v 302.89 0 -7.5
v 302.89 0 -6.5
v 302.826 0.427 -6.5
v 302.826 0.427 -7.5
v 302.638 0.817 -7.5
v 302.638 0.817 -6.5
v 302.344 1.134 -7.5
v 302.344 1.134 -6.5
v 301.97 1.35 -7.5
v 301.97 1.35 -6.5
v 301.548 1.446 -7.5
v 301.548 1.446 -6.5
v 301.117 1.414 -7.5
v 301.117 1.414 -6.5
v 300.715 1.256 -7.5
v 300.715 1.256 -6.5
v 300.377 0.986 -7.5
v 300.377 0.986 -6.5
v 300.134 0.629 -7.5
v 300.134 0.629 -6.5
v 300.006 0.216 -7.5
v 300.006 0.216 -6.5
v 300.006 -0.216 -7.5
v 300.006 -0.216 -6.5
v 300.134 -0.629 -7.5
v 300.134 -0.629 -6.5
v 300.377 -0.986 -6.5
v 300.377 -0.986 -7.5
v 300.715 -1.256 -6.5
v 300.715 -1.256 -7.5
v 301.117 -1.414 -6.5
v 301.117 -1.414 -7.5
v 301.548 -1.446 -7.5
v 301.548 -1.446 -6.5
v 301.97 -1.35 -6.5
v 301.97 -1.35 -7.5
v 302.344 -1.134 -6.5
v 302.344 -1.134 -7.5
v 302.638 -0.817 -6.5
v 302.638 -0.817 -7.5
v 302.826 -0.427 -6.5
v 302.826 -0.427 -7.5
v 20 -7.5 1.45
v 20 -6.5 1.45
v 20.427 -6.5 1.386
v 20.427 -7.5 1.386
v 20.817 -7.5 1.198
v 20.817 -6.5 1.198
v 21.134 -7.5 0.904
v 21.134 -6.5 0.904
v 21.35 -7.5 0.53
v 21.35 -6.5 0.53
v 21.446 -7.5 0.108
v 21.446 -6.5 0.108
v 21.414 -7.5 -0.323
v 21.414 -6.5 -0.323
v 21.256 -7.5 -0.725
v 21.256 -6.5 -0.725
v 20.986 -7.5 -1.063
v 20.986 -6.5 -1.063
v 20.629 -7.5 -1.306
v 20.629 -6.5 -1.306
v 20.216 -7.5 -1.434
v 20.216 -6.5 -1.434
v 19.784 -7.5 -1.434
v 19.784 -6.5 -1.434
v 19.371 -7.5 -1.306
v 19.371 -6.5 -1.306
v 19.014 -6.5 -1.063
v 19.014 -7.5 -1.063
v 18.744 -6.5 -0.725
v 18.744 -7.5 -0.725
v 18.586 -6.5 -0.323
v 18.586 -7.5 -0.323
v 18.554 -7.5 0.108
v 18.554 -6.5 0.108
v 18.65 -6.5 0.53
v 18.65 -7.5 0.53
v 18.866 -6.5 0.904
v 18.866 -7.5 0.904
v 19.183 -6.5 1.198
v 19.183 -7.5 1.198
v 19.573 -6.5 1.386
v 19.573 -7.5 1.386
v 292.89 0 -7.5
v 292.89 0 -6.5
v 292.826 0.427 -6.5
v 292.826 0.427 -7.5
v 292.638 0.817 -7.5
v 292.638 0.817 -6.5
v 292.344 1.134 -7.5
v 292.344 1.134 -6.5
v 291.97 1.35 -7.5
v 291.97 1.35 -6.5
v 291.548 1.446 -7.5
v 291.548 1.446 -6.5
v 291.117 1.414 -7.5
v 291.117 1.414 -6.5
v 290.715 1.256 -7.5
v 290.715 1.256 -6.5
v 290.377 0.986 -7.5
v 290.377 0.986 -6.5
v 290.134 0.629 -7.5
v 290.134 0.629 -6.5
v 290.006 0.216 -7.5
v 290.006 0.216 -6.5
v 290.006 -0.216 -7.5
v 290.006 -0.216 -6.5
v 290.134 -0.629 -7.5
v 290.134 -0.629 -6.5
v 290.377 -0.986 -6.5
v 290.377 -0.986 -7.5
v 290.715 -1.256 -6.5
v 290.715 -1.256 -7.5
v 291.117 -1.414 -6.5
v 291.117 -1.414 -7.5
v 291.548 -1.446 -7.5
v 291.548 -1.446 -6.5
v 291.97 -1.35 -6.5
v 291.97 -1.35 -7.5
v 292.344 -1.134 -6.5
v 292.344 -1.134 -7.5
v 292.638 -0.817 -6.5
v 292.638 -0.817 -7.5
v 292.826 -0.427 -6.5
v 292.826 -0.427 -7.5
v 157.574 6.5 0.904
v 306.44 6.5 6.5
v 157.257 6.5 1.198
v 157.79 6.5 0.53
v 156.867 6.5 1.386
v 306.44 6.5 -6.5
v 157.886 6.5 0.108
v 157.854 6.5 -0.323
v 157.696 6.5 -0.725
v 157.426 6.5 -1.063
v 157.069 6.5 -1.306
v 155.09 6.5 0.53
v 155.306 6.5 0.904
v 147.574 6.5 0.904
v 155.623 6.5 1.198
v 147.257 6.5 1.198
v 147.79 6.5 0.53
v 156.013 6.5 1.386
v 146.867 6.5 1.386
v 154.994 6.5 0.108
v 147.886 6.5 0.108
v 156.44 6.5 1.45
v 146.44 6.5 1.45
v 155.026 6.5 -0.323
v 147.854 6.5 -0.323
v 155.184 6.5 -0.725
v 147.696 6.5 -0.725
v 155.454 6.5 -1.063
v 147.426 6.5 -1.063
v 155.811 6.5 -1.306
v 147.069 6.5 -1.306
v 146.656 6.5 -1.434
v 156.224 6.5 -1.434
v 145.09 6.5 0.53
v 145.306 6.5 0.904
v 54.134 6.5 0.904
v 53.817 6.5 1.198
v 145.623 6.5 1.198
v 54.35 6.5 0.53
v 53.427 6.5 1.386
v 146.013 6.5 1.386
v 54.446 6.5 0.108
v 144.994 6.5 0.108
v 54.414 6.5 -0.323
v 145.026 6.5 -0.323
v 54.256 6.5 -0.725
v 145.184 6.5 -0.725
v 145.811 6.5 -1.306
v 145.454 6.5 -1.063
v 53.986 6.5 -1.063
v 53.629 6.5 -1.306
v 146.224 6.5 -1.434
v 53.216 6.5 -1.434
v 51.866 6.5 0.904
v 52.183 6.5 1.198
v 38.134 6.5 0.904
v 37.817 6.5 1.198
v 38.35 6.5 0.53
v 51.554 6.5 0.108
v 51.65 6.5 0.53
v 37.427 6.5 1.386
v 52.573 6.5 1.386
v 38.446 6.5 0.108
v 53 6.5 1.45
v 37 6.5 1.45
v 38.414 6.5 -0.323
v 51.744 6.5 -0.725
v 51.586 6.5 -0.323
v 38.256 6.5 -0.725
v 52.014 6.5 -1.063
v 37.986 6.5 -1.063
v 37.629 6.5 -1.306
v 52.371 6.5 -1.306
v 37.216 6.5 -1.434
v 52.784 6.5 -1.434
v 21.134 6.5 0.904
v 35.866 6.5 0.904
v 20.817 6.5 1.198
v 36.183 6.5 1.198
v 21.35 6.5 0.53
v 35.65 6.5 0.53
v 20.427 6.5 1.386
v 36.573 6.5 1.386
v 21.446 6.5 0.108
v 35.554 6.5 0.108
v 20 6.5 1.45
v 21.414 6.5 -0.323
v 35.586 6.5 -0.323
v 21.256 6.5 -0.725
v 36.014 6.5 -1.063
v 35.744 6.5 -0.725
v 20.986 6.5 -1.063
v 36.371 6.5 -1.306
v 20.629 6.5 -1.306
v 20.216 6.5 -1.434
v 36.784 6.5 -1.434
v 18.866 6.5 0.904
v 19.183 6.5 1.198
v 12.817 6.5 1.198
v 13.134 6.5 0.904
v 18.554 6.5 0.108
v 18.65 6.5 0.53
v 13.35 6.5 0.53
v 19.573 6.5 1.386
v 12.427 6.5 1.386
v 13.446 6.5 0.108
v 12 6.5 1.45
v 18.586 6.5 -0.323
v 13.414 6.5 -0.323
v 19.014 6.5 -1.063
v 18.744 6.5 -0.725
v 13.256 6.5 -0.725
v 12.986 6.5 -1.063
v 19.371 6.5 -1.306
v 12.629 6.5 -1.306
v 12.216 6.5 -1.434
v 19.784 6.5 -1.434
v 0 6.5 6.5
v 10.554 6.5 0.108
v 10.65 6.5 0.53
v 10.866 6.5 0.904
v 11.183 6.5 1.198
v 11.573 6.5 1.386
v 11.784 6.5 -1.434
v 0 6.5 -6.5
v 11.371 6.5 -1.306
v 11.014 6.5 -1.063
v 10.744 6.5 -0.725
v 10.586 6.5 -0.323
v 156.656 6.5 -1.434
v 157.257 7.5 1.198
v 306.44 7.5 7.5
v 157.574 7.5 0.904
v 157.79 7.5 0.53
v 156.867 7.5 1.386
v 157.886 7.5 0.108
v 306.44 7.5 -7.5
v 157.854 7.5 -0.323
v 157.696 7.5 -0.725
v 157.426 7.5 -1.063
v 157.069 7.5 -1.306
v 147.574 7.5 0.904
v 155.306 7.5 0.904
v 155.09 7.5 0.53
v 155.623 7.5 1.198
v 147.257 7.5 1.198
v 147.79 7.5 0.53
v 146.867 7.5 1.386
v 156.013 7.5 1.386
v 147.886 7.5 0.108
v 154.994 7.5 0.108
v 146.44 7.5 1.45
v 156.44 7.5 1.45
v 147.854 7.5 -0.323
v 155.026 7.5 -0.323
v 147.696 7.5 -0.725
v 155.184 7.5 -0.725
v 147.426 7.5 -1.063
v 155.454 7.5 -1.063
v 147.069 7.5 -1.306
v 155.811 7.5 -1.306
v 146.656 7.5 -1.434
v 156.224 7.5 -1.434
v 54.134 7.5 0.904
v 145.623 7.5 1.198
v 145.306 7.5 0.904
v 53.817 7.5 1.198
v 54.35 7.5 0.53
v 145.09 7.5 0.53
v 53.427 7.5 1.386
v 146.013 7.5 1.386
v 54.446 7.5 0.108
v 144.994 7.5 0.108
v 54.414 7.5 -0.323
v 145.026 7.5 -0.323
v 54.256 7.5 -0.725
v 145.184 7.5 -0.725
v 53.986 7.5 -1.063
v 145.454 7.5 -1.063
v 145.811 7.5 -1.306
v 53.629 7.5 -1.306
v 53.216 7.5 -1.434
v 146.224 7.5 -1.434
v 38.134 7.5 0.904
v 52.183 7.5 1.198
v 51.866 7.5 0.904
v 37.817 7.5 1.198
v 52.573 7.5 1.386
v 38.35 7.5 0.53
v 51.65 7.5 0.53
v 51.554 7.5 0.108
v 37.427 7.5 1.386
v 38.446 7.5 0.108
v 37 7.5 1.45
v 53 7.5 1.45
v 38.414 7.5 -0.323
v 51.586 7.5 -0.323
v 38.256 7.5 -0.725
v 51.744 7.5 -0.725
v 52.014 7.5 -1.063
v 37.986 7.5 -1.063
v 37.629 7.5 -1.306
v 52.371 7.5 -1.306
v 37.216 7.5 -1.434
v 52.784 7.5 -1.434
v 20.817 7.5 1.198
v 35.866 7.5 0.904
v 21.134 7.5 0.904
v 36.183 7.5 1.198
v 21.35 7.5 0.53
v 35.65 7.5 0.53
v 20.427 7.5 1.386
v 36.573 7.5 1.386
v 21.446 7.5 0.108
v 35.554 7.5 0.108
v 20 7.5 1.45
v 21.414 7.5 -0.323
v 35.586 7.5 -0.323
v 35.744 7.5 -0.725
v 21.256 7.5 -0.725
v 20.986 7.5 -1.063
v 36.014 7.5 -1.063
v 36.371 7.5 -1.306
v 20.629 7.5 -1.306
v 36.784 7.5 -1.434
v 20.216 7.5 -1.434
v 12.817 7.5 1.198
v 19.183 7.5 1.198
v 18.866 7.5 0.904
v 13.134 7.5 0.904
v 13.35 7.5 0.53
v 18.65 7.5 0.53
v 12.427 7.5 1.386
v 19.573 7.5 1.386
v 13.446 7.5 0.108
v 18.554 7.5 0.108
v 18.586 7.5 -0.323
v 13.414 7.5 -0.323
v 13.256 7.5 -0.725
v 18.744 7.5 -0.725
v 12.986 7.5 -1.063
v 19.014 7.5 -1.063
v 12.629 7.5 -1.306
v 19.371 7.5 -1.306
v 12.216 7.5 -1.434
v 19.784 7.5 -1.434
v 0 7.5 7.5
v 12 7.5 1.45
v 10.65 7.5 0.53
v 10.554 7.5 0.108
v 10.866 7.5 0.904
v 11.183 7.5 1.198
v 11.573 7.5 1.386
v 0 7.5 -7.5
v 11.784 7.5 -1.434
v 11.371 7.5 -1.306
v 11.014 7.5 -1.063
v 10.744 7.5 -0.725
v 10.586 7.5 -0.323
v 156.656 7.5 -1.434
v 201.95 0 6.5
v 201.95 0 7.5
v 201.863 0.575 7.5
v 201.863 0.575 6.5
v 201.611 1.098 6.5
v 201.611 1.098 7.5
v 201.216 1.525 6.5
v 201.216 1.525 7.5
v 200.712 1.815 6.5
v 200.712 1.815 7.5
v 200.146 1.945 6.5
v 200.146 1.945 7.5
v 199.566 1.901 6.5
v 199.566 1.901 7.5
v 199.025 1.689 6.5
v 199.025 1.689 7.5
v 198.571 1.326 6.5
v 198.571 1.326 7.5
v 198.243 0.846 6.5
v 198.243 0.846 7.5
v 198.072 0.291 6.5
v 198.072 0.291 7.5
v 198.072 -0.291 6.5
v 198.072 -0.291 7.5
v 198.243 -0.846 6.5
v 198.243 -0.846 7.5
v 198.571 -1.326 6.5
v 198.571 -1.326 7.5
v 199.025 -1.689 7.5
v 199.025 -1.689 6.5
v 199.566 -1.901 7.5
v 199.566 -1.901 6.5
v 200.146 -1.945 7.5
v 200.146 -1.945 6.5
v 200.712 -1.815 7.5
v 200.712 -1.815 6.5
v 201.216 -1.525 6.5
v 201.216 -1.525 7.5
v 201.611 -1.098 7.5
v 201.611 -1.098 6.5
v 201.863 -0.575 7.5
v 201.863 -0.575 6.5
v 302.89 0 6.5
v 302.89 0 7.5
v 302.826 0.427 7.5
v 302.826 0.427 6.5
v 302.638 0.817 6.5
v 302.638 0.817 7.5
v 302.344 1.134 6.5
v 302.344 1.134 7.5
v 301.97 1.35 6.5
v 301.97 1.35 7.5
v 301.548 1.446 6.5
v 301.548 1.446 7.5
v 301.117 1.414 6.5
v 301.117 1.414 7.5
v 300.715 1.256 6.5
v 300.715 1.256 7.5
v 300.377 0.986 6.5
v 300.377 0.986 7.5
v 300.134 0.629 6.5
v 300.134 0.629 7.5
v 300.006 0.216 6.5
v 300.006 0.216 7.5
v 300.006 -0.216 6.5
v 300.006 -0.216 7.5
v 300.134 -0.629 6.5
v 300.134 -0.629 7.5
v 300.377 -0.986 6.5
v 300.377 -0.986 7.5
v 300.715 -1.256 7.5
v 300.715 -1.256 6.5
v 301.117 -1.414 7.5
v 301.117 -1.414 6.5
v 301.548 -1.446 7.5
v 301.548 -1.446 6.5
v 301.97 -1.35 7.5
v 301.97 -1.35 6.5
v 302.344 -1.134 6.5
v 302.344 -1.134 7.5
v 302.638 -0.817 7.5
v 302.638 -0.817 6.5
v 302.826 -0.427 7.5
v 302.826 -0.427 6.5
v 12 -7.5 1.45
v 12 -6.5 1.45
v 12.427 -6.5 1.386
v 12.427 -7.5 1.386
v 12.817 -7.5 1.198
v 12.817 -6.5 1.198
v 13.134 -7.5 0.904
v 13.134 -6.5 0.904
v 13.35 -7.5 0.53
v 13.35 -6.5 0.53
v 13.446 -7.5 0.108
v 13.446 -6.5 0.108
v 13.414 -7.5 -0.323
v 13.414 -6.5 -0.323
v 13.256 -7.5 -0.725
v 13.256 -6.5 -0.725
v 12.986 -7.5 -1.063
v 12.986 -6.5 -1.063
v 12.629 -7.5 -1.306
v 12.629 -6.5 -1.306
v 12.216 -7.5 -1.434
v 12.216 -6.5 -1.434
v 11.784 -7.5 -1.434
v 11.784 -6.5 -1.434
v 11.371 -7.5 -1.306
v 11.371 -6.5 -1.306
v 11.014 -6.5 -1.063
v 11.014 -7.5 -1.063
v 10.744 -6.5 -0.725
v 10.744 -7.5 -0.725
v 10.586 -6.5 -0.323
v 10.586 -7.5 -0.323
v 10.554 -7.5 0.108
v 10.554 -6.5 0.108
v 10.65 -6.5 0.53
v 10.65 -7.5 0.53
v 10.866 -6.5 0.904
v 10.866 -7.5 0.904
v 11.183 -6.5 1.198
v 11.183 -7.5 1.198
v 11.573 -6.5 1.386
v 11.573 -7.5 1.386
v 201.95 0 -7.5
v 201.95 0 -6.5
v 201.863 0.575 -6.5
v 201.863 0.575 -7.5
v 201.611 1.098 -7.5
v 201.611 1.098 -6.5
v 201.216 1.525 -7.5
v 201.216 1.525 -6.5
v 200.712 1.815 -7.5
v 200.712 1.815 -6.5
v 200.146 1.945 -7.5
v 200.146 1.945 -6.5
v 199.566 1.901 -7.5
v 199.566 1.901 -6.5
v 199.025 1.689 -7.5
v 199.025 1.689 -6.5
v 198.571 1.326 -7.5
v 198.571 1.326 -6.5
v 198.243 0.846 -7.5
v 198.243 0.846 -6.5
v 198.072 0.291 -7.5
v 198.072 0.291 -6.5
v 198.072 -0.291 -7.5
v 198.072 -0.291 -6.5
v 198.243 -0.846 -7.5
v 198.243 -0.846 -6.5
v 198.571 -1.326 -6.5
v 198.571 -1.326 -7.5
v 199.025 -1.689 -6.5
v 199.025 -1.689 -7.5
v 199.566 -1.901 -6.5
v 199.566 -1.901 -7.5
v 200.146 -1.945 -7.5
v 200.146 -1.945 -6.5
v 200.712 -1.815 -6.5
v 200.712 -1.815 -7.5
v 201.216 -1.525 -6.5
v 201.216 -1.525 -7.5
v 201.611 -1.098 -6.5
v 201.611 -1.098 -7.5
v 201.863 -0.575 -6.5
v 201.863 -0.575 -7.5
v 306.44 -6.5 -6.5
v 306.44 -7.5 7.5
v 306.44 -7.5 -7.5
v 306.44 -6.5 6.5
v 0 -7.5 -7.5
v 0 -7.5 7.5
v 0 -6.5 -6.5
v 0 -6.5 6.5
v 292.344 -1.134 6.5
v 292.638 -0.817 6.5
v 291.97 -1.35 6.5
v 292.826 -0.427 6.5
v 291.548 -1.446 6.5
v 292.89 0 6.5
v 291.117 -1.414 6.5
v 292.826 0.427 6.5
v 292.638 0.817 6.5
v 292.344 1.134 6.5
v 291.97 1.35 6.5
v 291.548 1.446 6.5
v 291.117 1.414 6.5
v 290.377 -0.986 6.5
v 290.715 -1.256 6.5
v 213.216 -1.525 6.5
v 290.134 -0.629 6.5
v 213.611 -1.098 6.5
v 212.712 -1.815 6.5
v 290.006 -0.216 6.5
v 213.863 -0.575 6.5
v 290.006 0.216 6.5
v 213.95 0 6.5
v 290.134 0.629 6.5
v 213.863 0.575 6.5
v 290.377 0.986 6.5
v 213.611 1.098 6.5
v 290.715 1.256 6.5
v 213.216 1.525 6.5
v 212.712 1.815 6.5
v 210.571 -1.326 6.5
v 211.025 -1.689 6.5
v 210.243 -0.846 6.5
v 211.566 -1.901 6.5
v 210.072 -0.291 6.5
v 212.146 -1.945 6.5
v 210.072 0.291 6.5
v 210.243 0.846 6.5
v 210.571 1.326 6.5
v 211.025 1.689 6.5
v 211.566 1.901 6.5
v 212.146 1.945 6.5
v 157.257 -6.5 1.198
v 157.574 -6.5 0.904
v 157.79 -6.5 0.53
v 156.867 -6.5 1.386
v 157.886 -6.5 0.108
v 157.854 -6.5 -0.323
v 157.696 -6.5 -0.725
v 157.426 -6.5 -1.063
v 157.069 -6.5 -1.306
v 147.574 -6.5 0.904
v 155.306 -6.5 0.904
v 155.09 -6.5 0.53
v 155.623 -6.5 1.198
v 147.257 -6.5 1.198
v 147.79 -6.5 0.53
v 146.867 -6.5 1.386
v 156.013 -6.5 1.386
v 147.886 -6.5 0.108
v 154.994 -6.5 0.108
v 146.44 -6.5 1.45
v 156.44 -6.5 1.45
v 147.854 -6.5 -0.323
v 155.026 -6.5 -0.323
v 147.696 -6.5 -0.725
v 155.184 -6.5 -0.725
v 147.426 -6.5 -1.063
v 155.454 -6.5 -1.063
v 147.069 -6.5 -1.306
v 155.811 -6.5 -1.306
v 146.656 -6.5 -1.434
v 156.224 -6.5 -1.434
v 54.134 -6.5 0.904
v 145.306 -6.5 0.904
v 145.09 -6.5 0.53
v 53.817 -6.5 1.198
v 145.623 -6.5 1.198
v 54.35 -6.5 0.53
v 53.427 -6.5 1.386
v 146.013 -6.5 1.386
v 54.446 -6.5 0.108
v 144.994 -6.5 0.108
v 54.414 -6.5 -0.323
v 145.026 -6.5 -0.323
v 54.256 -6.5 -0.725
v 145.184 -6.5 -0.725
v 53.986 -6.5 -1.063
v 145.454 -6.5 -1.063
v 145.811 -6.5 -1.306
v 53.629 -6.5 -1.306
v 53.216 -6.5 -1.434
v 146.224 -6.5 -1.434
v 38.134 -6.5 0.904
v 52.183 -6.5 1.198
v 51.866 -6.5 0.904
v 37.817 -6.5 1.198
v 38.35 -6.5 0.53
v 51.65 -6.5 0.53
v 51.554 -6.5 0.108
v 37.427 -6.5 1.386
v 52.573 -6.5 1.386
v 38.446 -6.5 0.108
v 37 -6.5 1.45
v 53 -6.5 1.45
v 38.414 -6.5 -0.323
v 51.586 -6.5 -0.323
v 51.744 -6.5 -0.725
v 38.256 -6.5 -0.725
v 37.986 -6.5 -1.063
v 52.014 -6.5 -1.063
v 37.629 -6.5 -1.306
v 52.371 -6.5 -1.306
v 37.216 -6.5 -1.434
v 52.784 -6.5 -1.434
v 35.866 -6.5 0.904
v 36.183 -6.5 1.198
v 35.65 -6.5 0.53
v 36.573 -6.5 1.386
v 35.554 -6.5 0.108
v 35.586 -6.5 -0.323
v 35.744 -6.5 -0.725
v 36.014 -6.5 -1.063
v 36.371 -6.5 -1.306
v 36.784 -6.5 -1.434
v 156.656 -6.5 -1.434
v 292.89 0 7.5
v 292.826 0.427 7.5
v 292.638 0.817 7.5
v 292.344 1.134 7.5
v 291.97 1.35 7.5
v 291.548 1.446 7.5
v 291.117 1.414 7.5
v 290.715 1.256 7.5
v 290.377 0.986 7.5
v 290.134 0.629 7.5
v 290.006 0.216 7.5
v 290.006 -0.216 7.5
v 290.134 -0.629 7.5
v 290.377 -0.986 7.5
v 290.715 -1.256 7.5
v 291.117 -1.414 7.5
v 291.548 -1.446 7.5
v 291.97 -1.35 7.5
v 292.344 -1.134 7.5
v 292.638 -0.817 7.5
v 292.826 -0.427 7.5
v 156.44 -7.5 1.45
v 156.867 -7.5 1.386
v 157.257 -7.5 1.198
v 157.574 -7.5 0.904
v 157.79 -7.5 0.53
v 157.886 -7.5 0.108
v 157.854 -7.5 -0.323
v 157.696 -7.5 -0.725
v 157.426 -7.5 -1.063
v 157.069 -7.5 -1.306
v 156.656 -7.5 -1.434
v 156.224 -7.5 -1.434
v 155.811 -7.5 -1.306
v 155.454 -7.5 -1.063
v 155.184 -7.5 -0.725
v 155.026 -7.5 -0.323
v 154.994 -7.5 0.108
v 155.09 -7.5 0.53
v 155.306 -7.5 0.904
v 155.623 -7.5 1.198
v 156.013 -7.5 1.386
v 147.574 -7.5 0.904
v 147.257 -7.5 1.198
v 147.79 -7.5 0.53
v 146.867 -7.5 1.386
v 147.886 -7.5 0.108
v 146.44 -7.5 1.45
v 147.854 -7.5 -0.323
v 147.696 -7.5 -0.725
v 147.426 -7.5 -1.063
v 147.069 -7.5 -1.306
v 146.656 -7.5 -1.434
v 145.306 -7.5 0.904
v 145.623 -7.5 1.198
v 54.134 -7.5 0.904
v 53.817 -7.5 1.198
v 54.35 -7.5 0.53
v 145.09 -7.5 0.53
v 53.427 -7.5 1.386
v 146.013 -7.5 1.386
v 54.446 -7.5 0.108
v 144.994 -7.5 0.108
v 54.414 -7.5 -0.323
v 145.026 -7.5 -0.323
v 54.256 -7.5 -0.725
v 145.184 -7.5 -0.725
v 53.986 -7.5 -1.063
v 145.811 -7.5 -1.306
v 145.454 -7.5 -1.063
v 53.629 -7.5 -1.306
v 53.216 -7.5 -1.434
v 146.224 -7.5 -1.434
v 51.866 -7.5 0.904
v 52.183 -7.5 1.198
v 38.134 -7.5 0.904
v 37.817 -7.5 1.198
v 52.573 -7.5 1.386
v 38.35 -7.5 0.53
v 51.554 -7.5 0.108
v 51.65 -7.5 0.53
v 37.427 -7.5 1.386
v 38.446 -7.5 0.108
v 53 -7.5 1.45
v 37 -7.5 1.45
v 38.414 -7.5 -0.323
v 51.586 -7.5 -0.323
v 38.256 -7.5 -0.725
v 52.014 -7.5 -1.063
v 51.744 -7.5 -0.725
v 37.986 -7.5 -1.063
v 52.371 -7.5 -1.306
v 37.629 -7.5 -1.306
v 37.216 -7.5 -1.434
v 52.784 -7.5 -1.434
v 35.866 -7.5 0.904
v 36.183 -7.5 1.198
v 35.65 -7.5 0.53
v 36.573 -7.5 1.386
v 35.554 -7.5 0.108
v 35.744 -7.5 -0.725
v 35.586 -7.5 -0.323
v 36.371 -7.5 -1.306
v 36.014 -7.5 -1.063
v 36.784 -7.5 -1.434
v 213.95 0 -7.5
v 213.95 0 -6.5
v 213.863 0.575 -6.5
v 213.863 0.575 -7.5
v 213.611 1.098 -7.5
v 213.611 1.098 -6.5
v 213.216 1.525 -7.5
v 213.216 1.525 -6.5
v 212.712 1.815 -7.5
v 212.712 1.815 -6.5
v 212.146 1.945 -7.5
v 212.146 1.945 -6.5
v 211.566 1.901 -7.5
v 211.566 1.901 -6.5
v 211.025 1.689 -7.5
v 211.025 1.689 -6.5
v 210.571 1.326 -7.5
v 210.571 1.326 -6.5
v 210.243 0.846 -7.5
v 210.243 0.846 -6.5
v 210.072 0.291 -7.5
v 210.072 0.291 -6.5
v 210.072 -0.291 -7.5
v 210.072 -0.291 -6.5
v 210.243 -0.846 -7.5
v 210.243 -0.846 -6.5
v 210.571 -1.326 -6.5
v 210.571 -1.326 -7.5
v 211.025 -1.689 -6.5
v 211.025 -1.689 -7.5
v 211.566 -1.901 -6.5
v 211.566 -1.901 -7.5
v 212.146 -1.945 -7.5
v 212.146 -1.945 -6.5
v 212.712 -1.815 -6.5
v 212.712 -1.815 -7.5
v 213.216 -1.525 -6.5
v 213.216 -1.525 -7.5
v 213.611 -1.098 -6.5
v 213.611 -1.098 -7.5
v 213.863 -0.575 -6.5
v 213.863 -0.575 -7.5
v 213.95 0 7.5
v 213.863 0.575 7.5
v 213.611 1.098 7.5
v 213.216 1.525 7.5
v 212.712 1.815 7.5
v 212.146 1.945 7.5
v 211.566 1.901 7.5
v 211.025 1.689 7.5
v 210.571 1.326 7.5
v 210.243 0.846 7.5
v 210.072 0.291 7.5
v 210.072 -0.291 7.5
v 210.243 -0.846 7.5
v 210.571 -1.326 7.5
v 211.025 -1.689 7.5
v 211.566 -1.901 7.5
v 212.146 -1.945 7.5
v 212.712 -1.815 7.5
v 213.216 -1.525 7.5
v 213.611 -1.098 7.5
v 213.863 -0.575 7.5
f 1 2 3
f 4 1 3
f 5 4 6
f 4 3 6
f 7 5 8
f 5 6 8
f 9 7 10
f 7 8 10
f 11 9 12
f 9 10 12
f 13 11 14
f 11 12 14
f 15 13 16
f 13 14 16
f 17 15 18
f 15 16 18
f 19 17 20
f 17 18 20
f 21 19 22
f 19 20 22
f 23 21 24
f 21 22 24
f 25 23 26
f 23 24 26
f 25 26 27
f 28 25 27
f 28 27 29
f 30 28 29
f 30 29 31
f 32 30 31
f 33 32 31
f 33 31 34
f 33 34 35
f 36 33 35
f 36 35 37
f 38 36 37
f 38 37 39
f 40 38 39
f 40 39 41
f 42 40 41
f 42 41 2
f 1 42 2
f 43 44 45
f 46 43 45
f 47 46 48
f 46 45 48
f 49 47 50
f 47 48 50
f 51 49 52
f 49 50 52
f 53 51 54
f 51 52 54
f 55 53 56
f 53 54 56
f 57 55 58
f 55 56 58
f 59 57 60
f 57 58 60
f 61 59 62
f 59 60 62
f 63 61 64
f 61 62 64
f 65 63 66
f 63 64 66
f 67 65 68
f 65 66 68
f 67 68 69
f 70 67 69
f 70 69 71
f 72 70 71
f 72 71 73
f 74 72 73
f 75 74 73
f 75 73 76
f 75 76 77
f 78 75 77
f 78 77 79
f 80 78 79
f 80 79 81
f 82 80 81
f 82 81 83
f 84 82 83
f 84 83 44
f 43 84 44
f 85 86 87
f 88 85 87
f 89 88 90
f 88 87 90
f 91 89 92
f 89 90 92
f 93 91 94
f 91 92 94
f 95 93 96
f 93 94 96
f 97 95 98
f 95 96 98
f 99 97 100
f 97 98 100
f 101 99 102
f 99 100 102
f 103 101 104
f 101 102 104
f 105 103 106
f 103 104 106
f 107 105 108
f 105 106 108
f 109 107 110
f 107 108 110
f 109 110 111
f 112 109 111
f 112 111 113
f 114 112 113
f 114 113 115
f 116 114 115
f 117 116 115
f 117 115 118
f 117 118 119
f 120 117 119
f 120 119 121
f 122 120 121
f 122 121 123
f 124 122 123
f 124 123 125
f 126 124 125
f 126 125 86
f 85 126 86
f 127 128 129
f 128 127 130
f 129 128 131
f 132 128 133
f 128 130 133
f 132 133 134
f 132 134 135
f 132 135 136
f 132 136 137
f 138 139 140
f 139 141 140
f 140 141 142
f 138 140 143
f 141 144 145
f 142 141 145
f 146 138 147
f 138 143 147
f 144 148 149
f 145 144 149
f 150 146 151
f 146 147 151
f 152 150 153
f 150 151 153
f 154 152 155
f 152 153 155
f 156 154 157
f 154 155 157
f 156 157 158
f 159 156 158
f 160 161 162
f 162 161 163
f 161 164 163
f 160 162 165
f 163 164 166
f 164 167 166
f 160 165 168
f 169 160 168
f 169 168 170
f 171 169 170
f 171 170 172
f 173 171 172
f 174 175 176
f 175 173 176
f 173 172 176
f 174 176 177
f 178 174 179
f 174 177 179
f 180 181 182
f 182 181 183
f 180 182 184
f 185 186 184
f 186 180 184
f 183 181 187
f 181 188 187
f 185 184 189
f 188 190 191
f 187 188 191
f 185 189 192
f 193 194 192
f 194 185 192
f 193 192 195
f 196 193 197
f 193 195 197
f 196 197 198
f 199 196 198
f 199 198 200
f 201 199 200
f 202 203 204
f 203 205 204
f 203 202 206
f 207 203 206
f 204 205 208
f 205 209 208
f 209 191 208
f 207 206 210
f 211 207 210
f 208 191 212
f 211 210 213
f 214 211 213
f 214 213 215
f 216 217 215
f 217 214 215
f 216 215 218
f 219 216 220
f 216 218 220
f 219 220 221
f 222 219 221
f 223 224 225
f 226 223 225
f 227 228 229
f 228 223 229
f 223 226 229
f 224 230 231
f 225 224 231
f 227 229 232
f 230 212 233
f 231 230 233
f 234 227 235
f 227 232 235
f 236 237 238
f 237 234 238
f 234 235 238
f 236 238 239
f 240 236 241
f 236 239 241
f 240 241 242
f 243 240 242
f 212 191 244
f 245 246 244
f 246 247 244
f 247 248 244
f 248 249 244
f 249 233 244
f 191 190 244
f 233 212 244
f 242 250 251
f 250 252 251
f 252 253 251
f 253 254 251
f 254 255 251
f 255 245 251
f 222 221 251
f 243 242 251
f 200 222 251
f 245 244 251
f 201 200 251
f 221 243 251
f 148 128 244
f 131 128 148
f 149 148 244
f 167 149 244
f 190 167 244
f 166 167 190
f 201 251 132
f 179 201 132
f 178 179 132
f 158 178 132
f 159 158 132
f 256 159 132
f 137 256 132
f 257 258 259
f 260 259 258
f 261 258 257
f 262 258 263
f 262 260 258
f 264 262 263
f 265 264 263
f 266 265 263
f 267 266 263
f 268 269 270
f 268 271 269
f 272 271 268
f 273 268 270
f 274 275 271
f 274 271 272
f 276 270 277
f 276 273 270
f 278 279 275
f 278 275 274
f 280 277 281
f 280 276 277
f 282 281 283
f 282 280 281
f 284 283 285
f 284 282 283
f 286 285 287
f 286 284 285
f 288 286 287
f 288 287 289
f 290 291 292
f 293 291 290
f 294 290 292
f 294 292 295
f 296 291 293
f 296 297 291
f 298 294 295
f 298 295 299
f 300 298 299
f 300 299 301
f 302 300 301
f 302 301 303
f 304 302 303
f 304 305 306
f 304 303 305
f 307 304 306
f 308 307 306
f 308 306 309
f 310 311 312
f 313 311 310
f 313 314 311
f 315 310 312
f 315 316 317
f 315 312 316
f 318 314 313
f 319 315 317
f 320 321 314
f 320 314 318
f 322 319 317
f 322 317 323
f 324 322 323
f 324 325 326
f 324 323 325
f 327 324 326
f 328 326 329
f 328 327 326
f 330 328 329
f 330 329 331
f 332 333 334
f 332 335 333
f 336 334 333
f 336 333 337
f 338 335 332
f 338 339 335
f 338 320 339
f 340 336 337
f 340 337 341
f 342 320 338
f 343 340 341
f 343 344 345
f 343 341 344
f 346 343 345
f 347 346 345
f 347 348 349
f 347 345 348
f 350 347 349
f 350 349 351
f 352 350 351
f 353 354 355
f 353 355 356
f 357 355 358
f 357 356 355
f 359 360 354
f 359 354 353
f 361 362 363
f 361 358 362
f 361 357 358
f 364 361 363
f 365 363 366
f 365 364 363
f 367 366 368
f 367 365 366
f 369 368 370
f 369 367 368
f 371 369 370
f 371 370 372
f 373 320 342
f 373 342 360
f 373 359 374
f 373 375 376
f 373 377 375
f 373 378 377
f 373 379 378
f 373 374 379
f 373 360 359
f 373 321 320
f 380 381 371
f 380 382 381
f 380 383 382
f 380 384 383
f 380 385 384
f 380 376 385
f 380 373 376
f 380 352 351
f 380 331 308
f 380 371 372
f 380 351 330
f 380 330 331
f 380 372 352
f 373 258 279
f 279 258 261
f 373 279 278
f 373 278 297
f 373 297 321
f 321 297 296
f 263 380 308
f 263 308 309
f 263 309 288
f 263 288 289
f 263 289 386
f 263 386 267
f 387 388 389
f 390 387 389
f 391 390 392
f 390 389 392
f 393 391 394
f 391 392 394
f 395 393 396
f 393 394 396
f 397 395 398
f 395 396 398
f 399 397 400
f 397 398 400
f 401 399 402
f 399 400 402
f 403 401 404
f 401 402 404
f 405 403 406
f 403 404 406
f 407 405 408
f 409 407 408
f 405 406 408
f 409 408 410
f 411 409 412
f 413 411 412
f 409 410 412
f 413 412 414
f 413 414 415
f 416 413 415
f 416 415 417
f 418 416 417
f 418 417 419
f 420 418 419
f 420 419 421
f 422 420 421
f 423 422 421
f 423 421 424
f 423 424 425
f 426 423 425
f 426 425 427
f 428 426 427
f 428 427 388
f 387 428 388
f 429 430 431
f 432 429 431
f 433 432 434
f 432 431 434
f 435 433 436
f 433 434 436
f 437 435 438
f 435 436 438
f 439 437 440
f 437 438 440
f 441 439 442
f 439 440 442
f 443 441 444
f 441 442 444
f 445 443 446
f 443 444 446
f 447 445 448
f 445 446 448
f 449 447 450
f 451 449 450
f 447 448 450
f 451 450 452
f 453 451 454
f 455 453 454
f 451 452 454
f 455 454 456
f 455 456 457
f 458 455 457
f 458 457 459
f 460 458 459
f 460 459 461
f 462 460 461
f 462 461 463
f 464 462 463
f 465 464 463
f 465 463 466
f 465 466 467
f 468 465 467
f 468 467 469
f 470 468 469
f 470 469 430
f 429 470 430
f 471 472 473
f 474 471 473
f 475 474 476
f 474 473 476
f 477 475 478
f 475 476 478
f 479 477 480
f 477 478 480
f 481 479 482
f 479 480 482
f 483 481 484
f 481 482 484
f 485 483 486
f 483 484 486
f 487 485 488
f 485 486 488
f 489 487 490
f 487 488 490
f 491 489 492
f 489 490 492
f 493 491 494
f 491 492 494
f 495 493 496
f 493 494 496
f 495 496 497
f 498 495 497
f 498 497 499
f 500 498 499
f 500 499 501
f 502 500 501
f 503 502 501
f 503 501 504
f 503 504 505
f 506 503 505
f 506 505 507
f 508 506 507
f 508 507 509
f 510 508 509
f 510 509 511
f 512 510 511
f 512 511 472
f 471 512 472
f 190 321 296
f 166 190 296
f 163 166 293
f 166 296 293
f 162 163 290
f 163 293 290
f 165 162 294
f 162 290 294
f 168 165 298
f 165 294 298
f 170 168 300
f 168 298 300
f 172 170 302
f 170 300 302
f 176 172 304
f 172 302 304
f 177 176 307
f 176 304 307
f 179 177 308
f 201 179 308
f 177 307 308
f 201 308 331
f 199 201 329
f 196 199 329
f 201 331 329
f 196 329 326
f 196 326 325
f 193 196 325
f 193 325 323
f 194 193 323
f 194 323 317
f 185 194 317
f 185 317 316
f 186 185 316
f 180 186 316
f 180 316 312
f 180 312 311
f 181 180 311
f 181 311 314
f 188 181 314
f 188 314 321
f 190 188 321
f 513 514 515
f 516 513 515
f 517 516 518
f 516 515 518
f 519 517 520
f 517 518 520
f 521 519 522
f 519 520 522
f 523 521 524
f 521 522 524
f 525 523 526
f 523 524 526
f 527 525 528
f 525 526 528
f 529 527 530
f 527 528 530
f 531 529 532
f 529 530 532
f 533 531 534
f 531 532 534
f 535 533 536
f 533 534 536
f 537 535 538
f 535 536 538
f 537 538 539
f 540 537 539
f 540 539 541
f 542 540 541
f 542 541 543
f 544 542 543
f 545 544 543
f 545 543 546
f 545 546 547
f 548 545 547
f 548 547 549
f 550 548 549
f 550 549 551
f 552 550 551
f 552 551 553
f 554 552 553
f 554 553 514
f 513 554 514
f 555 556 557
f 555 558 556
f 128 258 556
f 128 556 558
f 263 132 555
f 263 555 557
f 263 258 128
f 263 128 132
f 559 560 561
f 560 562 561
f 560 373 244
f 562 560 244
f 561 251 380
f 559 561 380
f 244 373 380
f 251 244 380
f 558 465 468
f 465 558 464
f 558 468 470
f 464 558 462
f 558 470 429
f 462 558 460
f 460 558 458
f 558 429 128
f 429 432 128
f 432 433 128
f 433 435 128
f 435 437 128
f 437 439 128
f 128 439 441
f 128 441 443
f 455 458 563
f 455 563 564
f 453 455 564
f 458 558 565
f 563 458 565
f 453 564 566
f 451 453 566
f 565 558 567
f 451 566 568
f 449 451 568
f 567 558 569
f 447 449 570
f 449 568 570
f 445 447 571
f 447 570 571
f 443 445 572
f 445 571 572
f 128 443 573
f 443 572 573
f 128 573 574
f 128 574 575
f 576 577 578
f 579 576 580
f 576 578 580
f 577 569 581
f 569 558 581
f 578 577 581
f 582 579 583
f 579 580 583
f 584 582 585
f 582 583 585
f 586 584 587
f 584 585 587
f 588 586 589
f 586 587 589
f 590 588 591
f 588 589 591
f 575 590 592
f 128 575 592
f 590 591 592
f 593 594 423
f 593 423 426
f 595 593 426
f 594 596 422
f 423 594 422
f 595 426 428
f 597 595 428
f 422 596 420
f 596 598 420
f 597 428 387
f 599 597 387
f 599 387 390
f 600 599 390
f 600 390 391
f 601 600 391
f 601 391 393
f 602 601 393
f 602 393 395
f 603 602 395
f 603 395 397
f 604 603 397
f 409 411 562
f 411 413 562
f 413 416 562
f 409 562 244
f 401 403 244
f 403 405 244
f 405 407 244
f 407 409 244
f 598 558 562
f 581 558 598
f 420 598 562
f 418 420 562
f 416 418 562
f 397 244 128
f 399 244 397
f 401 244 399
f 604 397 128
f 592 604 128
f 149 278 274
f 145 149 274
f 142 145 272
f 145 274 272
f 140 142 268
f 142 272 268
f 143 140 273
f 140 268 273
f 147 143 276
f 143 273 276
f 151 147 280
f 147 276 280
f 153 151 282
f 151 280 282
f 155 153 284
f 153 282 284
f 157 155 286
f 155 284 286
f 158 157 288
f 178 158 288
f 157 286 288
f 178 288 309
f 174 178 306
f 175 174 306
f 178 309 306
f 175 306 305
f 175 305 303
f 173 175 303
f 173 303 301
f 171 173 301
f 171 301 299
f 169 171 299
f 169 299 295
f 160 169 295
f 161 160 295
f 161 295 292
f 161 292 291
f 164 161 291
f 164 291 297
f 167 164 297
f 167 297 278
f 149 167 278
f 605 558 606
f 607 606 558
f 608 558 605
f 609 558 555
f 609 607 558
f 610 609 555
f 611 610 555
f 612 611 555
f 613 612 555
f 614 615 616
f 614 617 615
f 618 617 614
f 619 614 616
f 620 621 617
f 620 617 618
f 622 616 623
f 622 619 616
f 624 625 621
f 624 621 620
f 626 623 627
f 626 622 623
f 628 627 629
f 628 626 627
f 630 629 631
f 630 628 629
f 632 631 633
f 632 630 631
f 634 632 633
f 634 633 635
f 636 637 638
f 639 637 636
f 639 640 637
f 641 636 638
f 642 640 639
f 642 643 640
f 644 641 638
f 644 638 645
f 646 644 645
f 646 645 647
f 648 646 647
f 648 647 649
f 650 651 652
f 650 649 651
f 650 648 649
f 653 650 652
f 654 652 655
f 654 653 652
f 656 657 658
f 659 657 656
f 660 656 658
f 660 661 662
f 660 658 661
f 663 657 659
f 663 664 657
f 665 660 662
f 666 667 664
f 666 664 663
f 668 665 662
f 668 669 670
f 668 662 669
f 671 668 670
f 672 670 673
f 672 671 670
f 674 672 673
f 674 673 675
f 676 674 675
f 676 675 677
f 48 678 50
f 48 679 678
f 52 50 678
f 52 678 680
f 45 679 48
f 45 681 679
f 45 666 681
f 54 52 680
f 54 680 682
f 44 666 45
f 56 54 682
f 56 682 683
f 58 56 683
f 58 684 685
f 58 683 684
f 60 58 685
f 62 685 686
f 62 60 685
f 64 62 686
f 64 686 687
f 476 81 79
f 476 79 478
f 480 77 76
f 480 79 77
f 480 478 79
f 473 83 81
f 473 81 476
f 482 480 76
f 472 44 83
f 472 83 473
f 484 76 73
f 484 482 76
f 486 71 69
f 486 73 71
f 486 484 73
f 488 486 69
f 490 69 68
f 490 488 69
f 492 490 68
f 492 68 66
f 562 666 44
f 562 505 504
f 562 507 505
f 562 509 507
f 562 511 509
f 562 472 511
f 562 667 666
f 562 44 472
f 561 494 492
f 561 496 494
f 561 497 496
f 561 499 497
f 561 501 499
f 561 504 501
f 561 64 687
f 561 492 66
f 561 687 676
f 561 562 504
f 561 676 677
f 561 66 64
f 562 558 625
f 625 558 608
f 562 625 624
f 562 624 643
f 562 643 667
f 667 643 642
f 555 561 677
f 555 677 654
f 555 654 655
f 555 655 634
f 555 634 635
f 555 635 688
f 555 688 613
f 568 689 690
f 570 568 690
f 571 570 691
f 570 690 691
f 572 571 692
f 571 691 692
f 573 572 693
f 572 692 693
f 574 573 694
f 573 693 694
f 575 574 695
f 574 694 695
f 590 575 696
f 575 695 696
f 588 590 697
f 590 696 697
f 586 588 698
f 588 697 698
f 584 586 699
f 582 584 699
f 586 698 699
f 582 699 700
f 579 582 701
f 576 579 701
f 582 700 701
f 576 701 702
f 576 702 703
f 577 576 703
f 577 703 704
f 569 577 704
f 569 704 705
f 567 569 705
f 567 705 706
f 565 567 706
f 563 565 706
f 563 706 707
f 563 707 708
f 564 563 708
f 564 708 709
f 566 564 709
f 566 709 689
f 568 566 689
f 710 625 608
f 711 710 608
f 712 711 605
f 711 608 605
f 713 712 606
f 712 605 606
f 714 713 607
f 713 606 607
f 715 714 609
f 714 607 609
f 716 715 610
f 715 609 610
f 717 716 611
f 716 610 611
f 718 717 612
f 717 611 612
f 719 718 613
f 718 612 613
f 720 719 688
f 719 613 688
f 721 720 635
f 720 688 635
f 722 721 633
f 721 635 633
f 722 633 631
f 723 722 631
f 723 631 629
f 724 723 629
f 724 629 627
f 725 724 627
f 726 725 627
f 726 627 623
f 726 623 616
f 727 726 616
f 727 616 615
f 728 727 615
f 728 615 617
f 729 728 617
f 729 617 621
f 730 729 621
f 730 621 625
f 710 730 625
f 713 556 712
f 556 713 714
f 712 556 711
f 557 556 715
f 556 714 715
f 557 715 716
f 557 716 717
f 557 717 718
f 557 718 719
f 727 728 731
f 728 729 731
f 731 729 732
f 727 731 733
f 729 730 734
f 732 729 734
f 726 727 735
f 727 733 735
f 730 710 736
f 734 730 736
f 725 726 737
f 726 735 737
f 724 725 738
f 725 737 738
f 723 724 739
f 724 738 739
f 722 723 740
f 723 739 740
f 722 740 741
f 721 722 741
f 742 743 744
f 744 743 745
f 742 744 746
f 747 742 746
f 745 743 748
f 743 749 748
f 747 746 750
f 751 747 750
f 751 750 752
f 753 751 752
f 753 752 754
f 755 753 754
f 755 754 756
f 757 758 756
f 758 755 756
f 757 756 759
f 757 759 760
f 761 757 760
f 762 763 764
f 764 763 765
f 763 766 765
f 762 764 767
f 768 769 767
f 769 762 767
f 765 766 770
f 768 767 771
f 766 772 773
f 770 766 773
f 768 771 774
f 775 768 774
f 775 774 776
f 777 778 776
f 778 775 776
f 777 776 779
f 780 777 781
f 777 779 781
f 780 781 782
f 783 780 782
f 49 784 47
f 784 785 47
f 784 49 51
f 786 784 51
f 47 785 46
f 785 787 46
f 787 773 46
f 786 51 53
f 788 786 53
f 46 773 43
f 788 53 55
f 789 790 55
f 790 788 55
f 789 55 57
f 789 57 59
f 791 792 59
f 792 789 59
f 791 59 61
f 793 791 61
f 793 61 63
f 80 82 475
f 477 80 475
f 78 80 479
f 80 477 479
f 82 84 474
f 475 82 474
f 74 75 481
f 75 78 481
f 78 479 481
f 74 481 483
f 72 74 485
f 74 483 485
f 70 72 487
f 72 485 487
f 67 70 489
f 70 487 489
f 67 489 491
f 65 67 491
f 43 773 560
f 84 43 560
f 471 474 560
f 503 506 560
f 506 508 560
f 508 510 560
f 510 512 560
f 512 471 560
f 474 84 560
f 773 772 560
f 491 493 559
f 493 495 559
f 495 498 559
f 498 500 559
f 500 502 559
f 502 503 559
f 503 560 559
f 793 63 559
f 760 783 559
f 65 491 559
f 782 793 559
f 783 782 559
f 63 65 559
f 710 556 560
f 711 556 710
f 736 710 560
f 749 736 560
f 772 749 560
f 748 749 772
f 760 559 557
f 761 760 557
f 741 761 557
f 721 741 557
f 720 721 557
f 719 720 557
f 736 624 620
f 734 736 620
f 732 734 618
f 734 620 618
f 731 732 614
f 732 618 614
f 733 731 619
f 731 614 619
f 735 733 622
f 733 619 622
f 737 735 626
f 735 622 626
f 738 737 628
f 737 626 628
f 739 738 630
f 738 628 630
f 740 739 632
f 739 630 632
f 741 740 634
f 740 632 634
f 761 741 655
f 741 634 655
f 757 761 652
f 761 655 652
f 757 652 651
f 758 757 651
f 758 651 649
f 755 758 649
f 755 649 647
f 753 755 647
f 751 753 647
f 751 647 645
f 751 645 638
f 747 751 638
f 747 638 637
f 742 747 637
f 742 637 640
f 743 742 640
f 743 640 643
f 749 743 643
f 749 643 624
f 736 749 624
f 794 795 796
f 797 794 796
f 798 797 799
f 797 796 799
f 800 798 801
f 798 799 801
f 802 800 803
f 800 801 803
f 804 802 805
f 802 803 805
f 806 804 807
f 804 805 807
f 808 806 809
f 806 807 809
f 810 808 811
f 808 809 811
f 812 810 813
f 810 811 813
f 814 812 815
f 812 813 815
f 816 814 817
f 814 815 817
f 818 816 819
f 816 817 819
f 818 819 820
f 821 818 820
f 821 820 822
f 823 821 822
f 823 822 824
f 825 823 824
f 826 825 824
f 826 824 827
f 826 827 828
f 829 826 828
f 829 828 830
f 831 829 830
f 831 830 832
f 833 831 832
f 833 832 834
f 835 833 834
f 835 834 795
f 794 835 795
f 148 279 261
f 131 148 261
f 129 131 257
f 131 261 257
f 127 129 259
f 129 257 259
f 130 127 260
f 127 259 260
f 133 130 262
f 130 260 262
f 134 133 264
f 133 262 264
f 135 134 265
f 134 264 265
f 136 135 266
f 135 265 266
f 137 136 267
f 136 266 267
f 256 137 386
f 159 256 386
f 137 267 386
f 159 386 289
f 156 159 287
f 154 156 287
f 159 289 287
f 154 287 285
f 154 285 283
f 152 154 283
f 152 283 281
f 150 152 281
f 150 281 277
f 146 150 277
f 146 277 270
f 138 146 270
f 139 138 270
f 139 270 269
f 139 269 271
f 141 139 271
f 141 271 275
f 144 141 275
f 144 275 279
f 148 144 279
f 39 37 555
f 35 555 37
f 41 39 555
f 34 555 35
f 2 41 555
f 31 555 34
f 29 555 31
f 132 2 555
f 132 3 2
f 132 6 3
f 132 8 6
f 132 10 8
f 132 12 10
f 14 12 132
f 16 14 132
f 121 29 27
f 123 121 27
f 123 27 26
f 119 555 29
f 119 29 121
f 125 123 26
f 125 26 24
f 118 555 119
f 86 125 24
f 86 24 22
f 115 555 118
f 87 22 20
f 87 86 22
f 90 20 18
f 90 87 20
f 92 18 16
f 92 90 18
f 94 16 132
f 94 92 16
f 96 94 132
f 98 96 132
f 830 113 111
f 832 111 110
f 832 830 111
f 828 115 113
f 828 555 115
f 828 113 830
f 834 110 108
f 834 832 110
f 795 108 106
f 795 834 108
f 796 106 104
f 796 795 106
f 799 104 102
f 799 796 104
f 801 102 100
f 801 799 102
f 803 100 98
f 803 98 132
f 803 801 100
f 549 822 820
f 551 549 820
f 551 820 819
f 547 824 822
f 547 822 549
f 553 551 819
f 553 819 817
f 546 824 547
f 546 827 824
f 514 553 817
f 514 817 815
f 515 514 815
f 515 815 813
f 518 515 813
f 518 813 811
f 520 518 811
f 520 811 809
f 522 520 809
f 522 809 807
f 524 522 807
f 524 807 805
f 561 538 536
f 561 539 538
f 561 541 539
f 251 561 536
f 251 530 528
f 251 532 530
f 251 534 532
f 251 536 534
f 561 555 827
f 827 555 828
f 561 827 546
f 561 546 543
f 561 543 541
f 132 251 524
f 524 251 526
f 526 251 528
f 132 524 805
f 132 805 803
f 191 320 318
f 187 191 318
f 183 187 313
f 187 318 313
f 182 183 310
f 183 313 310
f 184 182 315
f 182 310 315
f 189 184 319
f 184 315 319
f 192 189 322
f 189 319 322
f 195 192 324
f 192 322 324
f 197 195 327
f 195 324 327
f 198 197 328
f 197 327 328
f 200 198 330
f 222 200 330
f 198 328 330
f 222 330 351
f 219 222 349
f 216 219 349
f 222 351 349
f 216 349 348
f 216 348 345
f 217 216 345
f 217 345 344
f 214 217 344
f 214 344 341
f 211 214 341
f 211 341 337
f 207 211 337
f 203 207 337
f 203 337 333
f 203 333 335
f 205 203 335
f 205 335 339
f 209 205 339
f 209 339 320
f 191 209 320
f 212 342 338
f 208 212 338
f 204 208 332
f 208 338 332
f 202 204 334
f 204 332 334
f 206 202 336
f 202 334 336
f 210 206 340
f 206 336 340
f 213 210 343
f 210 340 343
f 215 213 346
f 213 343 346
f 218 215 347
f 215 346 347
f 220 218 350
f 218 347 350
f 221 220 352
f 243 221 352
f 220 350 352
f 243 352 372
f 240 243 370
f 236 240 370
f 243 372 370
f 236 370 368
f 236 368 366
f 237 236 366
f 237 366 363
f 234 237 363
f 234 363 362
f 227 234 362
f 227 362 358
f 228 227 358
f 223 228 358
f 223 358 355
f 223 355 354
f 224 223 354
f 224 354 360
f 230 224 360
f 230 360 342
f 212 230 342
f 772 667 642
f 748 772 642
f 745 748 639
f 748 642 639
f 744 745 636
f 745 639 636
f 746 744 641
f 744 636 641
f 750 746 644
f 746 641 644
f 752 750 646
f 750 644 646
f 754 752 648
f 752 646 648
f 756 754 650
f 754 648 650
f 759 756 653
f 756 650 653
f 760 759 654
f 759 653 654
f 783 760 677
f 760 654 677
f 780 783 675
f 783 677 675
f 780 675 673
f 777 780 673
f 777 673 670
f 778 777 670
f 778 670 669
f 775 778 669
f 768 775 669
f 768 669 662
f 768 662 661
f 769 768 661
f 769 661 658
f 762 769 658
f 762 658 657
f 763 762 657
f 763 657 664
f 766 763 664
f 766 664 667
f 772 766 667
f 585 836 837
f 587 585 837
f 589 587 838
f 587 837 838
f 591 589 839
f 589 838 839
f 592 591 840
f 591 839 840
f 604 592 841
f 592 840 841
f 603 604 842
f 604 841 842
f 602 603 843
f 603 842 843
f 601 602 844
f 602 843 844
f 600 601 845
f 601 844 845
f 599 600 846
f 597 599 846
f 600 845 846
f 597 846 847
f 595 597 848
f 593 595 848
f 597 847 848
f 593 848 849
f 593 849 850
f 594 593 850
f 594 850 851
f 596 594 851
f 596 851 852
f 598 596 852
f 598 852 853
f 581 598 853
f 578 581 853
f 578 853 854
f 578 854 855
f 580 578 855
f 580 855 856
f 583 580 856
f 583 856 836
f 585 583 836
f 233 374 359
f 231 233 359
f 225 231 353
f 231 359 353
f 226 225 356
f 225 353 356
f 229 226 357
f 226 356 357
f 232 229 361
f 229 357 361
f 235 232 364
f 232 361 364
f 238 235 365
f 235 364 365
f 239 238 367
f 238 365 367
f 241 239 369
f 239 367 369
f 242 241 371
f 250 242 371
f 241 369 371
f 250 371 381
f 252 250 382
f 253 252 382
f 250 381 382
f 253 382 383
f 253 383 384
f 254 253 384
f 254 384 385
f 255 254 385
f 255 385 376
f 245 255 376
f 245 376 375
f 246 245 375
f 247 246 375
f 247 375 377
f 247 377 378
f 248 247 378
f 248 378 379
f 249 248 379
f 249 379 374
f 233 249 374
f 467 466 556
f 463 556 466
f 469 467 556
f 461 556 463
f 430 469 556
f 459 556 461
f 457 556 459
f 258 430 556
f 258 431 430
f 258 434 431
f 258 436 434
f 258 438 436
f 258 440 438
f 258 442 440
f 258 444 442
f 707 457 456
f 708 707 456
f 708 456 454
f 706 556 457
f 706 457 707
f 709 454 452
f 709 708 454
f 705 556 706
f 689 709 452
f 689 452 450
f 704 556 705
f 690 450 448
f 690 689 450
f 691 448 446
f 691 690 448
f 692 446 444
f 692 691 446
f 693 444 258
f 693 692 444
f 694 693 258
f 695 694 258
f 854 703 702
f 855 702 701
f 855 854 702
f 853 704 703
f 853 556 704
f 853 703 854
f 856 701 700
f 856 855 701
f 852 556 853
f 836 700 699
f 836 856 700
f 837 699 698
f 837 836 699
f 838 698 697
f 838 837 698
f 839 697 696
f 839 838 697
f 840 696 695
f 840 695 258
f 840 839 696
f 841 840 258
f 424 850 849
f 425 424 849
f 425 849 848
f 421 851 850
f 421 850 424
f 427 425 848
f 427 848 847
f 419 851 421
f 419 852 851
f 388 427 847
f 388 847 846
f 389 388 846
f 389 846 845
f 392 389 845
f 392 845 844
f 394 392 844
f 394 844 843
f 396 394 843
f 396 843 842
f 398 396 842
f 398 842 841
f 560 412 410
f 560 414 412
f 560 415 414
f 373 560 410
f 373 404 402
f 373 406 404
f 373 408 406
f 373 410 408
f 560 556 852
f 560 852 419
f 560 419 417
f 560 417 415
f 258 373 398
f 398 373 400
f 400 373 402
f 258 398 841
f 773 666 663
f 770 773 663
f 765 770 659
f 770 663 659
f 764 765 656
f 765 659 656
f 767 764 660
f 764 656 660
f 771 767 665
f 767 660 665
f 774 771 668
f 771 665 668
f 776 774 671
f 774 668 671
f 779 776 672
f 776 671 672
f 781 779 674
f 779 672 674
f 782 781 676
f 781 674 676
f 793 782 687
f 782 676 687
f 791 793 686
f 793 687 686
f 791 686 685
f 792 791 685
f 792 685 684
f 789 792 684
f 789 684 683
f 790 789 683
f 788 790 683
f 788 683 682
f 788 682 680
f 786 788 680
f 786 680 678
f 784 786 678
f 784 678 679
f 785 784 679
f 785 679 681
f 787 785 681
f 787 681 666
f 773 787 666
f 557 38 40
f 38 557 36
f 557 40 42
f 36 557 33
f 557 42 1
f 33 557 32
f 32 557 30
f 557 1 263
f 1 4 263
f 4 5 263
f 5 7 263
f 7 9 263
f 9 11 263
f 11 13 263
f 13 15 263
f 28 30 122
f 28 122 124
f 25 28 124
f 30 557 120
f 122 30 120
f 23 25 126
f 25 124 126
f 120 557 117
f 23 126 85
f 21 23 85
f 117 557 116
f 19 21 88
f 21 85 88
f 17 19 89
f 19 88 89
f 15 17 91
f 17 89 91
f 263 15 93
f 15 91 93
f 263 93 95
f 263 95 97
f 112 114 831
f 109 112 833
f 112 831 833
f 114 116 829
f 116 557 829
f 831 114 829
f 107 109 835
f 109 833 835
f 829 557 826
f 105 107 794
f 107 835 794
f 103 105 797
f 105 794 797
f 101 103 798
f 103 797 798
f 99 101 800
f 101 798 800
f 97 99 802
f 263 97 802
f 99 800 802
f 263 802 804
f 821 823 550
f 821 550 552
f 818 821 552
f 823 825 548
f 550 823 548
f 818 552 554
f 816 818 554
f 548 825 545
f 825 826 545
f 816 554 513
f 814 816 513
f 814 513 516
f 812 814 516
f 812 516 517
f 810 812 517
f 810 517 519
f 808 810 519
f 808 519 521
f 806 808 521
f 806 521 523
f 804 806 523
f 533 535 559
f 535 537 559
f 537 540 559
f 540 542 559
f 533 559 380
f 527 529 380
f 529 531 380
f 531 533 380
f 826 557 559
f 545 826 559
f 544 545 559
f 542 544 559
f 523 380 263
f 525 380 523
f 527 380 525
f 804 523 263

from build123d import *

# Parameters (mm, degrees)
SKETCH_1_W          = 15
SKETCH_1_H          = 15
SKETCH_1_W_2        = 13
SKETCH_1_H_2        = 13
EXTRUDE_1_DEPTH     = 306.44
SKETCH_2_R          = 1.45
CUT_EXTRUDE_1_DEPTH = 307.898555878
SKETCH_3_R          = 1.45
SKETCH_3_R_2        = 1.95
CUT_EXTRUDE_2_DEPTH = 307.898555878


with BuildPart() as part:
    # 草图1 → 凸台-拉伸1 (new body)
    with BuildSketch(Plane(origin=(0, 0, 0), x_dir=(0, 0, -1), z_dir=(1, 0, 0))):
        Rectangle(SKETCH_1_W, SKETCH_1_H)
        Rectangle(SKETCH_1_W_2, SKETCH_1_H_2, mode=Mode.SUBTRACT)
    extrude(amount=EXTRUDE_1_DEPTH)

    # 草图2 → 切除-拉伸1 (cut, through all)
    with BuildSketch(Plane(origin=(0, 7.5, 0), x_dir=(1, 0, 0), z_dir=(0, 1, 0))):
        with Locations(Location((20, 0, 0), (0, 0, 270))):
            Circle(SKETCH_2_R)
        with Locations(Location((12, 0, 0), (0, 0, 270))):
            Circle(SKETCH_2_R)
        with Locations(Location((37, 0, 0), (0, 0, 270))):
            Circle(SKETCH_2_R)
        with Locations(Location((53, 0, 0), (0, 0, 270))):
            Circle(SKETCH_2_R)
        with Locations(Location((156.44, 0, 0), (0, 0, 270))):
            Circle(SKETCH_2_R)
        with Locations(Location((146.44, 0, 0), (0, 0, 270))):
            Circle(SKETCH_2_R)
    extrude(amount=-CUT_EXTRUDE_1_DEPTH, mode=Mode.SUBTRACT)

    # 草图3 → 切除-拉伸2 (cut, through all)
    with BuildSketch(Plane.XY.offset(7.5)):
        with Locations((301.44, 0)):
            Circle(SKETCH_3_R)
        with Locations((291.44, 0)):
            Circle(SKETCH_3_R)
        with Locations((200, 0)):
            Circle(SKETCH_3_R_2)
        with Locations((212, 0)):
            Circle(SKETCH_3_R_2)
    extrude(amount=-CUT_EXTRUDE_2_DEPTH, mode=Mode.SUBTRACT)


solid = part.part
